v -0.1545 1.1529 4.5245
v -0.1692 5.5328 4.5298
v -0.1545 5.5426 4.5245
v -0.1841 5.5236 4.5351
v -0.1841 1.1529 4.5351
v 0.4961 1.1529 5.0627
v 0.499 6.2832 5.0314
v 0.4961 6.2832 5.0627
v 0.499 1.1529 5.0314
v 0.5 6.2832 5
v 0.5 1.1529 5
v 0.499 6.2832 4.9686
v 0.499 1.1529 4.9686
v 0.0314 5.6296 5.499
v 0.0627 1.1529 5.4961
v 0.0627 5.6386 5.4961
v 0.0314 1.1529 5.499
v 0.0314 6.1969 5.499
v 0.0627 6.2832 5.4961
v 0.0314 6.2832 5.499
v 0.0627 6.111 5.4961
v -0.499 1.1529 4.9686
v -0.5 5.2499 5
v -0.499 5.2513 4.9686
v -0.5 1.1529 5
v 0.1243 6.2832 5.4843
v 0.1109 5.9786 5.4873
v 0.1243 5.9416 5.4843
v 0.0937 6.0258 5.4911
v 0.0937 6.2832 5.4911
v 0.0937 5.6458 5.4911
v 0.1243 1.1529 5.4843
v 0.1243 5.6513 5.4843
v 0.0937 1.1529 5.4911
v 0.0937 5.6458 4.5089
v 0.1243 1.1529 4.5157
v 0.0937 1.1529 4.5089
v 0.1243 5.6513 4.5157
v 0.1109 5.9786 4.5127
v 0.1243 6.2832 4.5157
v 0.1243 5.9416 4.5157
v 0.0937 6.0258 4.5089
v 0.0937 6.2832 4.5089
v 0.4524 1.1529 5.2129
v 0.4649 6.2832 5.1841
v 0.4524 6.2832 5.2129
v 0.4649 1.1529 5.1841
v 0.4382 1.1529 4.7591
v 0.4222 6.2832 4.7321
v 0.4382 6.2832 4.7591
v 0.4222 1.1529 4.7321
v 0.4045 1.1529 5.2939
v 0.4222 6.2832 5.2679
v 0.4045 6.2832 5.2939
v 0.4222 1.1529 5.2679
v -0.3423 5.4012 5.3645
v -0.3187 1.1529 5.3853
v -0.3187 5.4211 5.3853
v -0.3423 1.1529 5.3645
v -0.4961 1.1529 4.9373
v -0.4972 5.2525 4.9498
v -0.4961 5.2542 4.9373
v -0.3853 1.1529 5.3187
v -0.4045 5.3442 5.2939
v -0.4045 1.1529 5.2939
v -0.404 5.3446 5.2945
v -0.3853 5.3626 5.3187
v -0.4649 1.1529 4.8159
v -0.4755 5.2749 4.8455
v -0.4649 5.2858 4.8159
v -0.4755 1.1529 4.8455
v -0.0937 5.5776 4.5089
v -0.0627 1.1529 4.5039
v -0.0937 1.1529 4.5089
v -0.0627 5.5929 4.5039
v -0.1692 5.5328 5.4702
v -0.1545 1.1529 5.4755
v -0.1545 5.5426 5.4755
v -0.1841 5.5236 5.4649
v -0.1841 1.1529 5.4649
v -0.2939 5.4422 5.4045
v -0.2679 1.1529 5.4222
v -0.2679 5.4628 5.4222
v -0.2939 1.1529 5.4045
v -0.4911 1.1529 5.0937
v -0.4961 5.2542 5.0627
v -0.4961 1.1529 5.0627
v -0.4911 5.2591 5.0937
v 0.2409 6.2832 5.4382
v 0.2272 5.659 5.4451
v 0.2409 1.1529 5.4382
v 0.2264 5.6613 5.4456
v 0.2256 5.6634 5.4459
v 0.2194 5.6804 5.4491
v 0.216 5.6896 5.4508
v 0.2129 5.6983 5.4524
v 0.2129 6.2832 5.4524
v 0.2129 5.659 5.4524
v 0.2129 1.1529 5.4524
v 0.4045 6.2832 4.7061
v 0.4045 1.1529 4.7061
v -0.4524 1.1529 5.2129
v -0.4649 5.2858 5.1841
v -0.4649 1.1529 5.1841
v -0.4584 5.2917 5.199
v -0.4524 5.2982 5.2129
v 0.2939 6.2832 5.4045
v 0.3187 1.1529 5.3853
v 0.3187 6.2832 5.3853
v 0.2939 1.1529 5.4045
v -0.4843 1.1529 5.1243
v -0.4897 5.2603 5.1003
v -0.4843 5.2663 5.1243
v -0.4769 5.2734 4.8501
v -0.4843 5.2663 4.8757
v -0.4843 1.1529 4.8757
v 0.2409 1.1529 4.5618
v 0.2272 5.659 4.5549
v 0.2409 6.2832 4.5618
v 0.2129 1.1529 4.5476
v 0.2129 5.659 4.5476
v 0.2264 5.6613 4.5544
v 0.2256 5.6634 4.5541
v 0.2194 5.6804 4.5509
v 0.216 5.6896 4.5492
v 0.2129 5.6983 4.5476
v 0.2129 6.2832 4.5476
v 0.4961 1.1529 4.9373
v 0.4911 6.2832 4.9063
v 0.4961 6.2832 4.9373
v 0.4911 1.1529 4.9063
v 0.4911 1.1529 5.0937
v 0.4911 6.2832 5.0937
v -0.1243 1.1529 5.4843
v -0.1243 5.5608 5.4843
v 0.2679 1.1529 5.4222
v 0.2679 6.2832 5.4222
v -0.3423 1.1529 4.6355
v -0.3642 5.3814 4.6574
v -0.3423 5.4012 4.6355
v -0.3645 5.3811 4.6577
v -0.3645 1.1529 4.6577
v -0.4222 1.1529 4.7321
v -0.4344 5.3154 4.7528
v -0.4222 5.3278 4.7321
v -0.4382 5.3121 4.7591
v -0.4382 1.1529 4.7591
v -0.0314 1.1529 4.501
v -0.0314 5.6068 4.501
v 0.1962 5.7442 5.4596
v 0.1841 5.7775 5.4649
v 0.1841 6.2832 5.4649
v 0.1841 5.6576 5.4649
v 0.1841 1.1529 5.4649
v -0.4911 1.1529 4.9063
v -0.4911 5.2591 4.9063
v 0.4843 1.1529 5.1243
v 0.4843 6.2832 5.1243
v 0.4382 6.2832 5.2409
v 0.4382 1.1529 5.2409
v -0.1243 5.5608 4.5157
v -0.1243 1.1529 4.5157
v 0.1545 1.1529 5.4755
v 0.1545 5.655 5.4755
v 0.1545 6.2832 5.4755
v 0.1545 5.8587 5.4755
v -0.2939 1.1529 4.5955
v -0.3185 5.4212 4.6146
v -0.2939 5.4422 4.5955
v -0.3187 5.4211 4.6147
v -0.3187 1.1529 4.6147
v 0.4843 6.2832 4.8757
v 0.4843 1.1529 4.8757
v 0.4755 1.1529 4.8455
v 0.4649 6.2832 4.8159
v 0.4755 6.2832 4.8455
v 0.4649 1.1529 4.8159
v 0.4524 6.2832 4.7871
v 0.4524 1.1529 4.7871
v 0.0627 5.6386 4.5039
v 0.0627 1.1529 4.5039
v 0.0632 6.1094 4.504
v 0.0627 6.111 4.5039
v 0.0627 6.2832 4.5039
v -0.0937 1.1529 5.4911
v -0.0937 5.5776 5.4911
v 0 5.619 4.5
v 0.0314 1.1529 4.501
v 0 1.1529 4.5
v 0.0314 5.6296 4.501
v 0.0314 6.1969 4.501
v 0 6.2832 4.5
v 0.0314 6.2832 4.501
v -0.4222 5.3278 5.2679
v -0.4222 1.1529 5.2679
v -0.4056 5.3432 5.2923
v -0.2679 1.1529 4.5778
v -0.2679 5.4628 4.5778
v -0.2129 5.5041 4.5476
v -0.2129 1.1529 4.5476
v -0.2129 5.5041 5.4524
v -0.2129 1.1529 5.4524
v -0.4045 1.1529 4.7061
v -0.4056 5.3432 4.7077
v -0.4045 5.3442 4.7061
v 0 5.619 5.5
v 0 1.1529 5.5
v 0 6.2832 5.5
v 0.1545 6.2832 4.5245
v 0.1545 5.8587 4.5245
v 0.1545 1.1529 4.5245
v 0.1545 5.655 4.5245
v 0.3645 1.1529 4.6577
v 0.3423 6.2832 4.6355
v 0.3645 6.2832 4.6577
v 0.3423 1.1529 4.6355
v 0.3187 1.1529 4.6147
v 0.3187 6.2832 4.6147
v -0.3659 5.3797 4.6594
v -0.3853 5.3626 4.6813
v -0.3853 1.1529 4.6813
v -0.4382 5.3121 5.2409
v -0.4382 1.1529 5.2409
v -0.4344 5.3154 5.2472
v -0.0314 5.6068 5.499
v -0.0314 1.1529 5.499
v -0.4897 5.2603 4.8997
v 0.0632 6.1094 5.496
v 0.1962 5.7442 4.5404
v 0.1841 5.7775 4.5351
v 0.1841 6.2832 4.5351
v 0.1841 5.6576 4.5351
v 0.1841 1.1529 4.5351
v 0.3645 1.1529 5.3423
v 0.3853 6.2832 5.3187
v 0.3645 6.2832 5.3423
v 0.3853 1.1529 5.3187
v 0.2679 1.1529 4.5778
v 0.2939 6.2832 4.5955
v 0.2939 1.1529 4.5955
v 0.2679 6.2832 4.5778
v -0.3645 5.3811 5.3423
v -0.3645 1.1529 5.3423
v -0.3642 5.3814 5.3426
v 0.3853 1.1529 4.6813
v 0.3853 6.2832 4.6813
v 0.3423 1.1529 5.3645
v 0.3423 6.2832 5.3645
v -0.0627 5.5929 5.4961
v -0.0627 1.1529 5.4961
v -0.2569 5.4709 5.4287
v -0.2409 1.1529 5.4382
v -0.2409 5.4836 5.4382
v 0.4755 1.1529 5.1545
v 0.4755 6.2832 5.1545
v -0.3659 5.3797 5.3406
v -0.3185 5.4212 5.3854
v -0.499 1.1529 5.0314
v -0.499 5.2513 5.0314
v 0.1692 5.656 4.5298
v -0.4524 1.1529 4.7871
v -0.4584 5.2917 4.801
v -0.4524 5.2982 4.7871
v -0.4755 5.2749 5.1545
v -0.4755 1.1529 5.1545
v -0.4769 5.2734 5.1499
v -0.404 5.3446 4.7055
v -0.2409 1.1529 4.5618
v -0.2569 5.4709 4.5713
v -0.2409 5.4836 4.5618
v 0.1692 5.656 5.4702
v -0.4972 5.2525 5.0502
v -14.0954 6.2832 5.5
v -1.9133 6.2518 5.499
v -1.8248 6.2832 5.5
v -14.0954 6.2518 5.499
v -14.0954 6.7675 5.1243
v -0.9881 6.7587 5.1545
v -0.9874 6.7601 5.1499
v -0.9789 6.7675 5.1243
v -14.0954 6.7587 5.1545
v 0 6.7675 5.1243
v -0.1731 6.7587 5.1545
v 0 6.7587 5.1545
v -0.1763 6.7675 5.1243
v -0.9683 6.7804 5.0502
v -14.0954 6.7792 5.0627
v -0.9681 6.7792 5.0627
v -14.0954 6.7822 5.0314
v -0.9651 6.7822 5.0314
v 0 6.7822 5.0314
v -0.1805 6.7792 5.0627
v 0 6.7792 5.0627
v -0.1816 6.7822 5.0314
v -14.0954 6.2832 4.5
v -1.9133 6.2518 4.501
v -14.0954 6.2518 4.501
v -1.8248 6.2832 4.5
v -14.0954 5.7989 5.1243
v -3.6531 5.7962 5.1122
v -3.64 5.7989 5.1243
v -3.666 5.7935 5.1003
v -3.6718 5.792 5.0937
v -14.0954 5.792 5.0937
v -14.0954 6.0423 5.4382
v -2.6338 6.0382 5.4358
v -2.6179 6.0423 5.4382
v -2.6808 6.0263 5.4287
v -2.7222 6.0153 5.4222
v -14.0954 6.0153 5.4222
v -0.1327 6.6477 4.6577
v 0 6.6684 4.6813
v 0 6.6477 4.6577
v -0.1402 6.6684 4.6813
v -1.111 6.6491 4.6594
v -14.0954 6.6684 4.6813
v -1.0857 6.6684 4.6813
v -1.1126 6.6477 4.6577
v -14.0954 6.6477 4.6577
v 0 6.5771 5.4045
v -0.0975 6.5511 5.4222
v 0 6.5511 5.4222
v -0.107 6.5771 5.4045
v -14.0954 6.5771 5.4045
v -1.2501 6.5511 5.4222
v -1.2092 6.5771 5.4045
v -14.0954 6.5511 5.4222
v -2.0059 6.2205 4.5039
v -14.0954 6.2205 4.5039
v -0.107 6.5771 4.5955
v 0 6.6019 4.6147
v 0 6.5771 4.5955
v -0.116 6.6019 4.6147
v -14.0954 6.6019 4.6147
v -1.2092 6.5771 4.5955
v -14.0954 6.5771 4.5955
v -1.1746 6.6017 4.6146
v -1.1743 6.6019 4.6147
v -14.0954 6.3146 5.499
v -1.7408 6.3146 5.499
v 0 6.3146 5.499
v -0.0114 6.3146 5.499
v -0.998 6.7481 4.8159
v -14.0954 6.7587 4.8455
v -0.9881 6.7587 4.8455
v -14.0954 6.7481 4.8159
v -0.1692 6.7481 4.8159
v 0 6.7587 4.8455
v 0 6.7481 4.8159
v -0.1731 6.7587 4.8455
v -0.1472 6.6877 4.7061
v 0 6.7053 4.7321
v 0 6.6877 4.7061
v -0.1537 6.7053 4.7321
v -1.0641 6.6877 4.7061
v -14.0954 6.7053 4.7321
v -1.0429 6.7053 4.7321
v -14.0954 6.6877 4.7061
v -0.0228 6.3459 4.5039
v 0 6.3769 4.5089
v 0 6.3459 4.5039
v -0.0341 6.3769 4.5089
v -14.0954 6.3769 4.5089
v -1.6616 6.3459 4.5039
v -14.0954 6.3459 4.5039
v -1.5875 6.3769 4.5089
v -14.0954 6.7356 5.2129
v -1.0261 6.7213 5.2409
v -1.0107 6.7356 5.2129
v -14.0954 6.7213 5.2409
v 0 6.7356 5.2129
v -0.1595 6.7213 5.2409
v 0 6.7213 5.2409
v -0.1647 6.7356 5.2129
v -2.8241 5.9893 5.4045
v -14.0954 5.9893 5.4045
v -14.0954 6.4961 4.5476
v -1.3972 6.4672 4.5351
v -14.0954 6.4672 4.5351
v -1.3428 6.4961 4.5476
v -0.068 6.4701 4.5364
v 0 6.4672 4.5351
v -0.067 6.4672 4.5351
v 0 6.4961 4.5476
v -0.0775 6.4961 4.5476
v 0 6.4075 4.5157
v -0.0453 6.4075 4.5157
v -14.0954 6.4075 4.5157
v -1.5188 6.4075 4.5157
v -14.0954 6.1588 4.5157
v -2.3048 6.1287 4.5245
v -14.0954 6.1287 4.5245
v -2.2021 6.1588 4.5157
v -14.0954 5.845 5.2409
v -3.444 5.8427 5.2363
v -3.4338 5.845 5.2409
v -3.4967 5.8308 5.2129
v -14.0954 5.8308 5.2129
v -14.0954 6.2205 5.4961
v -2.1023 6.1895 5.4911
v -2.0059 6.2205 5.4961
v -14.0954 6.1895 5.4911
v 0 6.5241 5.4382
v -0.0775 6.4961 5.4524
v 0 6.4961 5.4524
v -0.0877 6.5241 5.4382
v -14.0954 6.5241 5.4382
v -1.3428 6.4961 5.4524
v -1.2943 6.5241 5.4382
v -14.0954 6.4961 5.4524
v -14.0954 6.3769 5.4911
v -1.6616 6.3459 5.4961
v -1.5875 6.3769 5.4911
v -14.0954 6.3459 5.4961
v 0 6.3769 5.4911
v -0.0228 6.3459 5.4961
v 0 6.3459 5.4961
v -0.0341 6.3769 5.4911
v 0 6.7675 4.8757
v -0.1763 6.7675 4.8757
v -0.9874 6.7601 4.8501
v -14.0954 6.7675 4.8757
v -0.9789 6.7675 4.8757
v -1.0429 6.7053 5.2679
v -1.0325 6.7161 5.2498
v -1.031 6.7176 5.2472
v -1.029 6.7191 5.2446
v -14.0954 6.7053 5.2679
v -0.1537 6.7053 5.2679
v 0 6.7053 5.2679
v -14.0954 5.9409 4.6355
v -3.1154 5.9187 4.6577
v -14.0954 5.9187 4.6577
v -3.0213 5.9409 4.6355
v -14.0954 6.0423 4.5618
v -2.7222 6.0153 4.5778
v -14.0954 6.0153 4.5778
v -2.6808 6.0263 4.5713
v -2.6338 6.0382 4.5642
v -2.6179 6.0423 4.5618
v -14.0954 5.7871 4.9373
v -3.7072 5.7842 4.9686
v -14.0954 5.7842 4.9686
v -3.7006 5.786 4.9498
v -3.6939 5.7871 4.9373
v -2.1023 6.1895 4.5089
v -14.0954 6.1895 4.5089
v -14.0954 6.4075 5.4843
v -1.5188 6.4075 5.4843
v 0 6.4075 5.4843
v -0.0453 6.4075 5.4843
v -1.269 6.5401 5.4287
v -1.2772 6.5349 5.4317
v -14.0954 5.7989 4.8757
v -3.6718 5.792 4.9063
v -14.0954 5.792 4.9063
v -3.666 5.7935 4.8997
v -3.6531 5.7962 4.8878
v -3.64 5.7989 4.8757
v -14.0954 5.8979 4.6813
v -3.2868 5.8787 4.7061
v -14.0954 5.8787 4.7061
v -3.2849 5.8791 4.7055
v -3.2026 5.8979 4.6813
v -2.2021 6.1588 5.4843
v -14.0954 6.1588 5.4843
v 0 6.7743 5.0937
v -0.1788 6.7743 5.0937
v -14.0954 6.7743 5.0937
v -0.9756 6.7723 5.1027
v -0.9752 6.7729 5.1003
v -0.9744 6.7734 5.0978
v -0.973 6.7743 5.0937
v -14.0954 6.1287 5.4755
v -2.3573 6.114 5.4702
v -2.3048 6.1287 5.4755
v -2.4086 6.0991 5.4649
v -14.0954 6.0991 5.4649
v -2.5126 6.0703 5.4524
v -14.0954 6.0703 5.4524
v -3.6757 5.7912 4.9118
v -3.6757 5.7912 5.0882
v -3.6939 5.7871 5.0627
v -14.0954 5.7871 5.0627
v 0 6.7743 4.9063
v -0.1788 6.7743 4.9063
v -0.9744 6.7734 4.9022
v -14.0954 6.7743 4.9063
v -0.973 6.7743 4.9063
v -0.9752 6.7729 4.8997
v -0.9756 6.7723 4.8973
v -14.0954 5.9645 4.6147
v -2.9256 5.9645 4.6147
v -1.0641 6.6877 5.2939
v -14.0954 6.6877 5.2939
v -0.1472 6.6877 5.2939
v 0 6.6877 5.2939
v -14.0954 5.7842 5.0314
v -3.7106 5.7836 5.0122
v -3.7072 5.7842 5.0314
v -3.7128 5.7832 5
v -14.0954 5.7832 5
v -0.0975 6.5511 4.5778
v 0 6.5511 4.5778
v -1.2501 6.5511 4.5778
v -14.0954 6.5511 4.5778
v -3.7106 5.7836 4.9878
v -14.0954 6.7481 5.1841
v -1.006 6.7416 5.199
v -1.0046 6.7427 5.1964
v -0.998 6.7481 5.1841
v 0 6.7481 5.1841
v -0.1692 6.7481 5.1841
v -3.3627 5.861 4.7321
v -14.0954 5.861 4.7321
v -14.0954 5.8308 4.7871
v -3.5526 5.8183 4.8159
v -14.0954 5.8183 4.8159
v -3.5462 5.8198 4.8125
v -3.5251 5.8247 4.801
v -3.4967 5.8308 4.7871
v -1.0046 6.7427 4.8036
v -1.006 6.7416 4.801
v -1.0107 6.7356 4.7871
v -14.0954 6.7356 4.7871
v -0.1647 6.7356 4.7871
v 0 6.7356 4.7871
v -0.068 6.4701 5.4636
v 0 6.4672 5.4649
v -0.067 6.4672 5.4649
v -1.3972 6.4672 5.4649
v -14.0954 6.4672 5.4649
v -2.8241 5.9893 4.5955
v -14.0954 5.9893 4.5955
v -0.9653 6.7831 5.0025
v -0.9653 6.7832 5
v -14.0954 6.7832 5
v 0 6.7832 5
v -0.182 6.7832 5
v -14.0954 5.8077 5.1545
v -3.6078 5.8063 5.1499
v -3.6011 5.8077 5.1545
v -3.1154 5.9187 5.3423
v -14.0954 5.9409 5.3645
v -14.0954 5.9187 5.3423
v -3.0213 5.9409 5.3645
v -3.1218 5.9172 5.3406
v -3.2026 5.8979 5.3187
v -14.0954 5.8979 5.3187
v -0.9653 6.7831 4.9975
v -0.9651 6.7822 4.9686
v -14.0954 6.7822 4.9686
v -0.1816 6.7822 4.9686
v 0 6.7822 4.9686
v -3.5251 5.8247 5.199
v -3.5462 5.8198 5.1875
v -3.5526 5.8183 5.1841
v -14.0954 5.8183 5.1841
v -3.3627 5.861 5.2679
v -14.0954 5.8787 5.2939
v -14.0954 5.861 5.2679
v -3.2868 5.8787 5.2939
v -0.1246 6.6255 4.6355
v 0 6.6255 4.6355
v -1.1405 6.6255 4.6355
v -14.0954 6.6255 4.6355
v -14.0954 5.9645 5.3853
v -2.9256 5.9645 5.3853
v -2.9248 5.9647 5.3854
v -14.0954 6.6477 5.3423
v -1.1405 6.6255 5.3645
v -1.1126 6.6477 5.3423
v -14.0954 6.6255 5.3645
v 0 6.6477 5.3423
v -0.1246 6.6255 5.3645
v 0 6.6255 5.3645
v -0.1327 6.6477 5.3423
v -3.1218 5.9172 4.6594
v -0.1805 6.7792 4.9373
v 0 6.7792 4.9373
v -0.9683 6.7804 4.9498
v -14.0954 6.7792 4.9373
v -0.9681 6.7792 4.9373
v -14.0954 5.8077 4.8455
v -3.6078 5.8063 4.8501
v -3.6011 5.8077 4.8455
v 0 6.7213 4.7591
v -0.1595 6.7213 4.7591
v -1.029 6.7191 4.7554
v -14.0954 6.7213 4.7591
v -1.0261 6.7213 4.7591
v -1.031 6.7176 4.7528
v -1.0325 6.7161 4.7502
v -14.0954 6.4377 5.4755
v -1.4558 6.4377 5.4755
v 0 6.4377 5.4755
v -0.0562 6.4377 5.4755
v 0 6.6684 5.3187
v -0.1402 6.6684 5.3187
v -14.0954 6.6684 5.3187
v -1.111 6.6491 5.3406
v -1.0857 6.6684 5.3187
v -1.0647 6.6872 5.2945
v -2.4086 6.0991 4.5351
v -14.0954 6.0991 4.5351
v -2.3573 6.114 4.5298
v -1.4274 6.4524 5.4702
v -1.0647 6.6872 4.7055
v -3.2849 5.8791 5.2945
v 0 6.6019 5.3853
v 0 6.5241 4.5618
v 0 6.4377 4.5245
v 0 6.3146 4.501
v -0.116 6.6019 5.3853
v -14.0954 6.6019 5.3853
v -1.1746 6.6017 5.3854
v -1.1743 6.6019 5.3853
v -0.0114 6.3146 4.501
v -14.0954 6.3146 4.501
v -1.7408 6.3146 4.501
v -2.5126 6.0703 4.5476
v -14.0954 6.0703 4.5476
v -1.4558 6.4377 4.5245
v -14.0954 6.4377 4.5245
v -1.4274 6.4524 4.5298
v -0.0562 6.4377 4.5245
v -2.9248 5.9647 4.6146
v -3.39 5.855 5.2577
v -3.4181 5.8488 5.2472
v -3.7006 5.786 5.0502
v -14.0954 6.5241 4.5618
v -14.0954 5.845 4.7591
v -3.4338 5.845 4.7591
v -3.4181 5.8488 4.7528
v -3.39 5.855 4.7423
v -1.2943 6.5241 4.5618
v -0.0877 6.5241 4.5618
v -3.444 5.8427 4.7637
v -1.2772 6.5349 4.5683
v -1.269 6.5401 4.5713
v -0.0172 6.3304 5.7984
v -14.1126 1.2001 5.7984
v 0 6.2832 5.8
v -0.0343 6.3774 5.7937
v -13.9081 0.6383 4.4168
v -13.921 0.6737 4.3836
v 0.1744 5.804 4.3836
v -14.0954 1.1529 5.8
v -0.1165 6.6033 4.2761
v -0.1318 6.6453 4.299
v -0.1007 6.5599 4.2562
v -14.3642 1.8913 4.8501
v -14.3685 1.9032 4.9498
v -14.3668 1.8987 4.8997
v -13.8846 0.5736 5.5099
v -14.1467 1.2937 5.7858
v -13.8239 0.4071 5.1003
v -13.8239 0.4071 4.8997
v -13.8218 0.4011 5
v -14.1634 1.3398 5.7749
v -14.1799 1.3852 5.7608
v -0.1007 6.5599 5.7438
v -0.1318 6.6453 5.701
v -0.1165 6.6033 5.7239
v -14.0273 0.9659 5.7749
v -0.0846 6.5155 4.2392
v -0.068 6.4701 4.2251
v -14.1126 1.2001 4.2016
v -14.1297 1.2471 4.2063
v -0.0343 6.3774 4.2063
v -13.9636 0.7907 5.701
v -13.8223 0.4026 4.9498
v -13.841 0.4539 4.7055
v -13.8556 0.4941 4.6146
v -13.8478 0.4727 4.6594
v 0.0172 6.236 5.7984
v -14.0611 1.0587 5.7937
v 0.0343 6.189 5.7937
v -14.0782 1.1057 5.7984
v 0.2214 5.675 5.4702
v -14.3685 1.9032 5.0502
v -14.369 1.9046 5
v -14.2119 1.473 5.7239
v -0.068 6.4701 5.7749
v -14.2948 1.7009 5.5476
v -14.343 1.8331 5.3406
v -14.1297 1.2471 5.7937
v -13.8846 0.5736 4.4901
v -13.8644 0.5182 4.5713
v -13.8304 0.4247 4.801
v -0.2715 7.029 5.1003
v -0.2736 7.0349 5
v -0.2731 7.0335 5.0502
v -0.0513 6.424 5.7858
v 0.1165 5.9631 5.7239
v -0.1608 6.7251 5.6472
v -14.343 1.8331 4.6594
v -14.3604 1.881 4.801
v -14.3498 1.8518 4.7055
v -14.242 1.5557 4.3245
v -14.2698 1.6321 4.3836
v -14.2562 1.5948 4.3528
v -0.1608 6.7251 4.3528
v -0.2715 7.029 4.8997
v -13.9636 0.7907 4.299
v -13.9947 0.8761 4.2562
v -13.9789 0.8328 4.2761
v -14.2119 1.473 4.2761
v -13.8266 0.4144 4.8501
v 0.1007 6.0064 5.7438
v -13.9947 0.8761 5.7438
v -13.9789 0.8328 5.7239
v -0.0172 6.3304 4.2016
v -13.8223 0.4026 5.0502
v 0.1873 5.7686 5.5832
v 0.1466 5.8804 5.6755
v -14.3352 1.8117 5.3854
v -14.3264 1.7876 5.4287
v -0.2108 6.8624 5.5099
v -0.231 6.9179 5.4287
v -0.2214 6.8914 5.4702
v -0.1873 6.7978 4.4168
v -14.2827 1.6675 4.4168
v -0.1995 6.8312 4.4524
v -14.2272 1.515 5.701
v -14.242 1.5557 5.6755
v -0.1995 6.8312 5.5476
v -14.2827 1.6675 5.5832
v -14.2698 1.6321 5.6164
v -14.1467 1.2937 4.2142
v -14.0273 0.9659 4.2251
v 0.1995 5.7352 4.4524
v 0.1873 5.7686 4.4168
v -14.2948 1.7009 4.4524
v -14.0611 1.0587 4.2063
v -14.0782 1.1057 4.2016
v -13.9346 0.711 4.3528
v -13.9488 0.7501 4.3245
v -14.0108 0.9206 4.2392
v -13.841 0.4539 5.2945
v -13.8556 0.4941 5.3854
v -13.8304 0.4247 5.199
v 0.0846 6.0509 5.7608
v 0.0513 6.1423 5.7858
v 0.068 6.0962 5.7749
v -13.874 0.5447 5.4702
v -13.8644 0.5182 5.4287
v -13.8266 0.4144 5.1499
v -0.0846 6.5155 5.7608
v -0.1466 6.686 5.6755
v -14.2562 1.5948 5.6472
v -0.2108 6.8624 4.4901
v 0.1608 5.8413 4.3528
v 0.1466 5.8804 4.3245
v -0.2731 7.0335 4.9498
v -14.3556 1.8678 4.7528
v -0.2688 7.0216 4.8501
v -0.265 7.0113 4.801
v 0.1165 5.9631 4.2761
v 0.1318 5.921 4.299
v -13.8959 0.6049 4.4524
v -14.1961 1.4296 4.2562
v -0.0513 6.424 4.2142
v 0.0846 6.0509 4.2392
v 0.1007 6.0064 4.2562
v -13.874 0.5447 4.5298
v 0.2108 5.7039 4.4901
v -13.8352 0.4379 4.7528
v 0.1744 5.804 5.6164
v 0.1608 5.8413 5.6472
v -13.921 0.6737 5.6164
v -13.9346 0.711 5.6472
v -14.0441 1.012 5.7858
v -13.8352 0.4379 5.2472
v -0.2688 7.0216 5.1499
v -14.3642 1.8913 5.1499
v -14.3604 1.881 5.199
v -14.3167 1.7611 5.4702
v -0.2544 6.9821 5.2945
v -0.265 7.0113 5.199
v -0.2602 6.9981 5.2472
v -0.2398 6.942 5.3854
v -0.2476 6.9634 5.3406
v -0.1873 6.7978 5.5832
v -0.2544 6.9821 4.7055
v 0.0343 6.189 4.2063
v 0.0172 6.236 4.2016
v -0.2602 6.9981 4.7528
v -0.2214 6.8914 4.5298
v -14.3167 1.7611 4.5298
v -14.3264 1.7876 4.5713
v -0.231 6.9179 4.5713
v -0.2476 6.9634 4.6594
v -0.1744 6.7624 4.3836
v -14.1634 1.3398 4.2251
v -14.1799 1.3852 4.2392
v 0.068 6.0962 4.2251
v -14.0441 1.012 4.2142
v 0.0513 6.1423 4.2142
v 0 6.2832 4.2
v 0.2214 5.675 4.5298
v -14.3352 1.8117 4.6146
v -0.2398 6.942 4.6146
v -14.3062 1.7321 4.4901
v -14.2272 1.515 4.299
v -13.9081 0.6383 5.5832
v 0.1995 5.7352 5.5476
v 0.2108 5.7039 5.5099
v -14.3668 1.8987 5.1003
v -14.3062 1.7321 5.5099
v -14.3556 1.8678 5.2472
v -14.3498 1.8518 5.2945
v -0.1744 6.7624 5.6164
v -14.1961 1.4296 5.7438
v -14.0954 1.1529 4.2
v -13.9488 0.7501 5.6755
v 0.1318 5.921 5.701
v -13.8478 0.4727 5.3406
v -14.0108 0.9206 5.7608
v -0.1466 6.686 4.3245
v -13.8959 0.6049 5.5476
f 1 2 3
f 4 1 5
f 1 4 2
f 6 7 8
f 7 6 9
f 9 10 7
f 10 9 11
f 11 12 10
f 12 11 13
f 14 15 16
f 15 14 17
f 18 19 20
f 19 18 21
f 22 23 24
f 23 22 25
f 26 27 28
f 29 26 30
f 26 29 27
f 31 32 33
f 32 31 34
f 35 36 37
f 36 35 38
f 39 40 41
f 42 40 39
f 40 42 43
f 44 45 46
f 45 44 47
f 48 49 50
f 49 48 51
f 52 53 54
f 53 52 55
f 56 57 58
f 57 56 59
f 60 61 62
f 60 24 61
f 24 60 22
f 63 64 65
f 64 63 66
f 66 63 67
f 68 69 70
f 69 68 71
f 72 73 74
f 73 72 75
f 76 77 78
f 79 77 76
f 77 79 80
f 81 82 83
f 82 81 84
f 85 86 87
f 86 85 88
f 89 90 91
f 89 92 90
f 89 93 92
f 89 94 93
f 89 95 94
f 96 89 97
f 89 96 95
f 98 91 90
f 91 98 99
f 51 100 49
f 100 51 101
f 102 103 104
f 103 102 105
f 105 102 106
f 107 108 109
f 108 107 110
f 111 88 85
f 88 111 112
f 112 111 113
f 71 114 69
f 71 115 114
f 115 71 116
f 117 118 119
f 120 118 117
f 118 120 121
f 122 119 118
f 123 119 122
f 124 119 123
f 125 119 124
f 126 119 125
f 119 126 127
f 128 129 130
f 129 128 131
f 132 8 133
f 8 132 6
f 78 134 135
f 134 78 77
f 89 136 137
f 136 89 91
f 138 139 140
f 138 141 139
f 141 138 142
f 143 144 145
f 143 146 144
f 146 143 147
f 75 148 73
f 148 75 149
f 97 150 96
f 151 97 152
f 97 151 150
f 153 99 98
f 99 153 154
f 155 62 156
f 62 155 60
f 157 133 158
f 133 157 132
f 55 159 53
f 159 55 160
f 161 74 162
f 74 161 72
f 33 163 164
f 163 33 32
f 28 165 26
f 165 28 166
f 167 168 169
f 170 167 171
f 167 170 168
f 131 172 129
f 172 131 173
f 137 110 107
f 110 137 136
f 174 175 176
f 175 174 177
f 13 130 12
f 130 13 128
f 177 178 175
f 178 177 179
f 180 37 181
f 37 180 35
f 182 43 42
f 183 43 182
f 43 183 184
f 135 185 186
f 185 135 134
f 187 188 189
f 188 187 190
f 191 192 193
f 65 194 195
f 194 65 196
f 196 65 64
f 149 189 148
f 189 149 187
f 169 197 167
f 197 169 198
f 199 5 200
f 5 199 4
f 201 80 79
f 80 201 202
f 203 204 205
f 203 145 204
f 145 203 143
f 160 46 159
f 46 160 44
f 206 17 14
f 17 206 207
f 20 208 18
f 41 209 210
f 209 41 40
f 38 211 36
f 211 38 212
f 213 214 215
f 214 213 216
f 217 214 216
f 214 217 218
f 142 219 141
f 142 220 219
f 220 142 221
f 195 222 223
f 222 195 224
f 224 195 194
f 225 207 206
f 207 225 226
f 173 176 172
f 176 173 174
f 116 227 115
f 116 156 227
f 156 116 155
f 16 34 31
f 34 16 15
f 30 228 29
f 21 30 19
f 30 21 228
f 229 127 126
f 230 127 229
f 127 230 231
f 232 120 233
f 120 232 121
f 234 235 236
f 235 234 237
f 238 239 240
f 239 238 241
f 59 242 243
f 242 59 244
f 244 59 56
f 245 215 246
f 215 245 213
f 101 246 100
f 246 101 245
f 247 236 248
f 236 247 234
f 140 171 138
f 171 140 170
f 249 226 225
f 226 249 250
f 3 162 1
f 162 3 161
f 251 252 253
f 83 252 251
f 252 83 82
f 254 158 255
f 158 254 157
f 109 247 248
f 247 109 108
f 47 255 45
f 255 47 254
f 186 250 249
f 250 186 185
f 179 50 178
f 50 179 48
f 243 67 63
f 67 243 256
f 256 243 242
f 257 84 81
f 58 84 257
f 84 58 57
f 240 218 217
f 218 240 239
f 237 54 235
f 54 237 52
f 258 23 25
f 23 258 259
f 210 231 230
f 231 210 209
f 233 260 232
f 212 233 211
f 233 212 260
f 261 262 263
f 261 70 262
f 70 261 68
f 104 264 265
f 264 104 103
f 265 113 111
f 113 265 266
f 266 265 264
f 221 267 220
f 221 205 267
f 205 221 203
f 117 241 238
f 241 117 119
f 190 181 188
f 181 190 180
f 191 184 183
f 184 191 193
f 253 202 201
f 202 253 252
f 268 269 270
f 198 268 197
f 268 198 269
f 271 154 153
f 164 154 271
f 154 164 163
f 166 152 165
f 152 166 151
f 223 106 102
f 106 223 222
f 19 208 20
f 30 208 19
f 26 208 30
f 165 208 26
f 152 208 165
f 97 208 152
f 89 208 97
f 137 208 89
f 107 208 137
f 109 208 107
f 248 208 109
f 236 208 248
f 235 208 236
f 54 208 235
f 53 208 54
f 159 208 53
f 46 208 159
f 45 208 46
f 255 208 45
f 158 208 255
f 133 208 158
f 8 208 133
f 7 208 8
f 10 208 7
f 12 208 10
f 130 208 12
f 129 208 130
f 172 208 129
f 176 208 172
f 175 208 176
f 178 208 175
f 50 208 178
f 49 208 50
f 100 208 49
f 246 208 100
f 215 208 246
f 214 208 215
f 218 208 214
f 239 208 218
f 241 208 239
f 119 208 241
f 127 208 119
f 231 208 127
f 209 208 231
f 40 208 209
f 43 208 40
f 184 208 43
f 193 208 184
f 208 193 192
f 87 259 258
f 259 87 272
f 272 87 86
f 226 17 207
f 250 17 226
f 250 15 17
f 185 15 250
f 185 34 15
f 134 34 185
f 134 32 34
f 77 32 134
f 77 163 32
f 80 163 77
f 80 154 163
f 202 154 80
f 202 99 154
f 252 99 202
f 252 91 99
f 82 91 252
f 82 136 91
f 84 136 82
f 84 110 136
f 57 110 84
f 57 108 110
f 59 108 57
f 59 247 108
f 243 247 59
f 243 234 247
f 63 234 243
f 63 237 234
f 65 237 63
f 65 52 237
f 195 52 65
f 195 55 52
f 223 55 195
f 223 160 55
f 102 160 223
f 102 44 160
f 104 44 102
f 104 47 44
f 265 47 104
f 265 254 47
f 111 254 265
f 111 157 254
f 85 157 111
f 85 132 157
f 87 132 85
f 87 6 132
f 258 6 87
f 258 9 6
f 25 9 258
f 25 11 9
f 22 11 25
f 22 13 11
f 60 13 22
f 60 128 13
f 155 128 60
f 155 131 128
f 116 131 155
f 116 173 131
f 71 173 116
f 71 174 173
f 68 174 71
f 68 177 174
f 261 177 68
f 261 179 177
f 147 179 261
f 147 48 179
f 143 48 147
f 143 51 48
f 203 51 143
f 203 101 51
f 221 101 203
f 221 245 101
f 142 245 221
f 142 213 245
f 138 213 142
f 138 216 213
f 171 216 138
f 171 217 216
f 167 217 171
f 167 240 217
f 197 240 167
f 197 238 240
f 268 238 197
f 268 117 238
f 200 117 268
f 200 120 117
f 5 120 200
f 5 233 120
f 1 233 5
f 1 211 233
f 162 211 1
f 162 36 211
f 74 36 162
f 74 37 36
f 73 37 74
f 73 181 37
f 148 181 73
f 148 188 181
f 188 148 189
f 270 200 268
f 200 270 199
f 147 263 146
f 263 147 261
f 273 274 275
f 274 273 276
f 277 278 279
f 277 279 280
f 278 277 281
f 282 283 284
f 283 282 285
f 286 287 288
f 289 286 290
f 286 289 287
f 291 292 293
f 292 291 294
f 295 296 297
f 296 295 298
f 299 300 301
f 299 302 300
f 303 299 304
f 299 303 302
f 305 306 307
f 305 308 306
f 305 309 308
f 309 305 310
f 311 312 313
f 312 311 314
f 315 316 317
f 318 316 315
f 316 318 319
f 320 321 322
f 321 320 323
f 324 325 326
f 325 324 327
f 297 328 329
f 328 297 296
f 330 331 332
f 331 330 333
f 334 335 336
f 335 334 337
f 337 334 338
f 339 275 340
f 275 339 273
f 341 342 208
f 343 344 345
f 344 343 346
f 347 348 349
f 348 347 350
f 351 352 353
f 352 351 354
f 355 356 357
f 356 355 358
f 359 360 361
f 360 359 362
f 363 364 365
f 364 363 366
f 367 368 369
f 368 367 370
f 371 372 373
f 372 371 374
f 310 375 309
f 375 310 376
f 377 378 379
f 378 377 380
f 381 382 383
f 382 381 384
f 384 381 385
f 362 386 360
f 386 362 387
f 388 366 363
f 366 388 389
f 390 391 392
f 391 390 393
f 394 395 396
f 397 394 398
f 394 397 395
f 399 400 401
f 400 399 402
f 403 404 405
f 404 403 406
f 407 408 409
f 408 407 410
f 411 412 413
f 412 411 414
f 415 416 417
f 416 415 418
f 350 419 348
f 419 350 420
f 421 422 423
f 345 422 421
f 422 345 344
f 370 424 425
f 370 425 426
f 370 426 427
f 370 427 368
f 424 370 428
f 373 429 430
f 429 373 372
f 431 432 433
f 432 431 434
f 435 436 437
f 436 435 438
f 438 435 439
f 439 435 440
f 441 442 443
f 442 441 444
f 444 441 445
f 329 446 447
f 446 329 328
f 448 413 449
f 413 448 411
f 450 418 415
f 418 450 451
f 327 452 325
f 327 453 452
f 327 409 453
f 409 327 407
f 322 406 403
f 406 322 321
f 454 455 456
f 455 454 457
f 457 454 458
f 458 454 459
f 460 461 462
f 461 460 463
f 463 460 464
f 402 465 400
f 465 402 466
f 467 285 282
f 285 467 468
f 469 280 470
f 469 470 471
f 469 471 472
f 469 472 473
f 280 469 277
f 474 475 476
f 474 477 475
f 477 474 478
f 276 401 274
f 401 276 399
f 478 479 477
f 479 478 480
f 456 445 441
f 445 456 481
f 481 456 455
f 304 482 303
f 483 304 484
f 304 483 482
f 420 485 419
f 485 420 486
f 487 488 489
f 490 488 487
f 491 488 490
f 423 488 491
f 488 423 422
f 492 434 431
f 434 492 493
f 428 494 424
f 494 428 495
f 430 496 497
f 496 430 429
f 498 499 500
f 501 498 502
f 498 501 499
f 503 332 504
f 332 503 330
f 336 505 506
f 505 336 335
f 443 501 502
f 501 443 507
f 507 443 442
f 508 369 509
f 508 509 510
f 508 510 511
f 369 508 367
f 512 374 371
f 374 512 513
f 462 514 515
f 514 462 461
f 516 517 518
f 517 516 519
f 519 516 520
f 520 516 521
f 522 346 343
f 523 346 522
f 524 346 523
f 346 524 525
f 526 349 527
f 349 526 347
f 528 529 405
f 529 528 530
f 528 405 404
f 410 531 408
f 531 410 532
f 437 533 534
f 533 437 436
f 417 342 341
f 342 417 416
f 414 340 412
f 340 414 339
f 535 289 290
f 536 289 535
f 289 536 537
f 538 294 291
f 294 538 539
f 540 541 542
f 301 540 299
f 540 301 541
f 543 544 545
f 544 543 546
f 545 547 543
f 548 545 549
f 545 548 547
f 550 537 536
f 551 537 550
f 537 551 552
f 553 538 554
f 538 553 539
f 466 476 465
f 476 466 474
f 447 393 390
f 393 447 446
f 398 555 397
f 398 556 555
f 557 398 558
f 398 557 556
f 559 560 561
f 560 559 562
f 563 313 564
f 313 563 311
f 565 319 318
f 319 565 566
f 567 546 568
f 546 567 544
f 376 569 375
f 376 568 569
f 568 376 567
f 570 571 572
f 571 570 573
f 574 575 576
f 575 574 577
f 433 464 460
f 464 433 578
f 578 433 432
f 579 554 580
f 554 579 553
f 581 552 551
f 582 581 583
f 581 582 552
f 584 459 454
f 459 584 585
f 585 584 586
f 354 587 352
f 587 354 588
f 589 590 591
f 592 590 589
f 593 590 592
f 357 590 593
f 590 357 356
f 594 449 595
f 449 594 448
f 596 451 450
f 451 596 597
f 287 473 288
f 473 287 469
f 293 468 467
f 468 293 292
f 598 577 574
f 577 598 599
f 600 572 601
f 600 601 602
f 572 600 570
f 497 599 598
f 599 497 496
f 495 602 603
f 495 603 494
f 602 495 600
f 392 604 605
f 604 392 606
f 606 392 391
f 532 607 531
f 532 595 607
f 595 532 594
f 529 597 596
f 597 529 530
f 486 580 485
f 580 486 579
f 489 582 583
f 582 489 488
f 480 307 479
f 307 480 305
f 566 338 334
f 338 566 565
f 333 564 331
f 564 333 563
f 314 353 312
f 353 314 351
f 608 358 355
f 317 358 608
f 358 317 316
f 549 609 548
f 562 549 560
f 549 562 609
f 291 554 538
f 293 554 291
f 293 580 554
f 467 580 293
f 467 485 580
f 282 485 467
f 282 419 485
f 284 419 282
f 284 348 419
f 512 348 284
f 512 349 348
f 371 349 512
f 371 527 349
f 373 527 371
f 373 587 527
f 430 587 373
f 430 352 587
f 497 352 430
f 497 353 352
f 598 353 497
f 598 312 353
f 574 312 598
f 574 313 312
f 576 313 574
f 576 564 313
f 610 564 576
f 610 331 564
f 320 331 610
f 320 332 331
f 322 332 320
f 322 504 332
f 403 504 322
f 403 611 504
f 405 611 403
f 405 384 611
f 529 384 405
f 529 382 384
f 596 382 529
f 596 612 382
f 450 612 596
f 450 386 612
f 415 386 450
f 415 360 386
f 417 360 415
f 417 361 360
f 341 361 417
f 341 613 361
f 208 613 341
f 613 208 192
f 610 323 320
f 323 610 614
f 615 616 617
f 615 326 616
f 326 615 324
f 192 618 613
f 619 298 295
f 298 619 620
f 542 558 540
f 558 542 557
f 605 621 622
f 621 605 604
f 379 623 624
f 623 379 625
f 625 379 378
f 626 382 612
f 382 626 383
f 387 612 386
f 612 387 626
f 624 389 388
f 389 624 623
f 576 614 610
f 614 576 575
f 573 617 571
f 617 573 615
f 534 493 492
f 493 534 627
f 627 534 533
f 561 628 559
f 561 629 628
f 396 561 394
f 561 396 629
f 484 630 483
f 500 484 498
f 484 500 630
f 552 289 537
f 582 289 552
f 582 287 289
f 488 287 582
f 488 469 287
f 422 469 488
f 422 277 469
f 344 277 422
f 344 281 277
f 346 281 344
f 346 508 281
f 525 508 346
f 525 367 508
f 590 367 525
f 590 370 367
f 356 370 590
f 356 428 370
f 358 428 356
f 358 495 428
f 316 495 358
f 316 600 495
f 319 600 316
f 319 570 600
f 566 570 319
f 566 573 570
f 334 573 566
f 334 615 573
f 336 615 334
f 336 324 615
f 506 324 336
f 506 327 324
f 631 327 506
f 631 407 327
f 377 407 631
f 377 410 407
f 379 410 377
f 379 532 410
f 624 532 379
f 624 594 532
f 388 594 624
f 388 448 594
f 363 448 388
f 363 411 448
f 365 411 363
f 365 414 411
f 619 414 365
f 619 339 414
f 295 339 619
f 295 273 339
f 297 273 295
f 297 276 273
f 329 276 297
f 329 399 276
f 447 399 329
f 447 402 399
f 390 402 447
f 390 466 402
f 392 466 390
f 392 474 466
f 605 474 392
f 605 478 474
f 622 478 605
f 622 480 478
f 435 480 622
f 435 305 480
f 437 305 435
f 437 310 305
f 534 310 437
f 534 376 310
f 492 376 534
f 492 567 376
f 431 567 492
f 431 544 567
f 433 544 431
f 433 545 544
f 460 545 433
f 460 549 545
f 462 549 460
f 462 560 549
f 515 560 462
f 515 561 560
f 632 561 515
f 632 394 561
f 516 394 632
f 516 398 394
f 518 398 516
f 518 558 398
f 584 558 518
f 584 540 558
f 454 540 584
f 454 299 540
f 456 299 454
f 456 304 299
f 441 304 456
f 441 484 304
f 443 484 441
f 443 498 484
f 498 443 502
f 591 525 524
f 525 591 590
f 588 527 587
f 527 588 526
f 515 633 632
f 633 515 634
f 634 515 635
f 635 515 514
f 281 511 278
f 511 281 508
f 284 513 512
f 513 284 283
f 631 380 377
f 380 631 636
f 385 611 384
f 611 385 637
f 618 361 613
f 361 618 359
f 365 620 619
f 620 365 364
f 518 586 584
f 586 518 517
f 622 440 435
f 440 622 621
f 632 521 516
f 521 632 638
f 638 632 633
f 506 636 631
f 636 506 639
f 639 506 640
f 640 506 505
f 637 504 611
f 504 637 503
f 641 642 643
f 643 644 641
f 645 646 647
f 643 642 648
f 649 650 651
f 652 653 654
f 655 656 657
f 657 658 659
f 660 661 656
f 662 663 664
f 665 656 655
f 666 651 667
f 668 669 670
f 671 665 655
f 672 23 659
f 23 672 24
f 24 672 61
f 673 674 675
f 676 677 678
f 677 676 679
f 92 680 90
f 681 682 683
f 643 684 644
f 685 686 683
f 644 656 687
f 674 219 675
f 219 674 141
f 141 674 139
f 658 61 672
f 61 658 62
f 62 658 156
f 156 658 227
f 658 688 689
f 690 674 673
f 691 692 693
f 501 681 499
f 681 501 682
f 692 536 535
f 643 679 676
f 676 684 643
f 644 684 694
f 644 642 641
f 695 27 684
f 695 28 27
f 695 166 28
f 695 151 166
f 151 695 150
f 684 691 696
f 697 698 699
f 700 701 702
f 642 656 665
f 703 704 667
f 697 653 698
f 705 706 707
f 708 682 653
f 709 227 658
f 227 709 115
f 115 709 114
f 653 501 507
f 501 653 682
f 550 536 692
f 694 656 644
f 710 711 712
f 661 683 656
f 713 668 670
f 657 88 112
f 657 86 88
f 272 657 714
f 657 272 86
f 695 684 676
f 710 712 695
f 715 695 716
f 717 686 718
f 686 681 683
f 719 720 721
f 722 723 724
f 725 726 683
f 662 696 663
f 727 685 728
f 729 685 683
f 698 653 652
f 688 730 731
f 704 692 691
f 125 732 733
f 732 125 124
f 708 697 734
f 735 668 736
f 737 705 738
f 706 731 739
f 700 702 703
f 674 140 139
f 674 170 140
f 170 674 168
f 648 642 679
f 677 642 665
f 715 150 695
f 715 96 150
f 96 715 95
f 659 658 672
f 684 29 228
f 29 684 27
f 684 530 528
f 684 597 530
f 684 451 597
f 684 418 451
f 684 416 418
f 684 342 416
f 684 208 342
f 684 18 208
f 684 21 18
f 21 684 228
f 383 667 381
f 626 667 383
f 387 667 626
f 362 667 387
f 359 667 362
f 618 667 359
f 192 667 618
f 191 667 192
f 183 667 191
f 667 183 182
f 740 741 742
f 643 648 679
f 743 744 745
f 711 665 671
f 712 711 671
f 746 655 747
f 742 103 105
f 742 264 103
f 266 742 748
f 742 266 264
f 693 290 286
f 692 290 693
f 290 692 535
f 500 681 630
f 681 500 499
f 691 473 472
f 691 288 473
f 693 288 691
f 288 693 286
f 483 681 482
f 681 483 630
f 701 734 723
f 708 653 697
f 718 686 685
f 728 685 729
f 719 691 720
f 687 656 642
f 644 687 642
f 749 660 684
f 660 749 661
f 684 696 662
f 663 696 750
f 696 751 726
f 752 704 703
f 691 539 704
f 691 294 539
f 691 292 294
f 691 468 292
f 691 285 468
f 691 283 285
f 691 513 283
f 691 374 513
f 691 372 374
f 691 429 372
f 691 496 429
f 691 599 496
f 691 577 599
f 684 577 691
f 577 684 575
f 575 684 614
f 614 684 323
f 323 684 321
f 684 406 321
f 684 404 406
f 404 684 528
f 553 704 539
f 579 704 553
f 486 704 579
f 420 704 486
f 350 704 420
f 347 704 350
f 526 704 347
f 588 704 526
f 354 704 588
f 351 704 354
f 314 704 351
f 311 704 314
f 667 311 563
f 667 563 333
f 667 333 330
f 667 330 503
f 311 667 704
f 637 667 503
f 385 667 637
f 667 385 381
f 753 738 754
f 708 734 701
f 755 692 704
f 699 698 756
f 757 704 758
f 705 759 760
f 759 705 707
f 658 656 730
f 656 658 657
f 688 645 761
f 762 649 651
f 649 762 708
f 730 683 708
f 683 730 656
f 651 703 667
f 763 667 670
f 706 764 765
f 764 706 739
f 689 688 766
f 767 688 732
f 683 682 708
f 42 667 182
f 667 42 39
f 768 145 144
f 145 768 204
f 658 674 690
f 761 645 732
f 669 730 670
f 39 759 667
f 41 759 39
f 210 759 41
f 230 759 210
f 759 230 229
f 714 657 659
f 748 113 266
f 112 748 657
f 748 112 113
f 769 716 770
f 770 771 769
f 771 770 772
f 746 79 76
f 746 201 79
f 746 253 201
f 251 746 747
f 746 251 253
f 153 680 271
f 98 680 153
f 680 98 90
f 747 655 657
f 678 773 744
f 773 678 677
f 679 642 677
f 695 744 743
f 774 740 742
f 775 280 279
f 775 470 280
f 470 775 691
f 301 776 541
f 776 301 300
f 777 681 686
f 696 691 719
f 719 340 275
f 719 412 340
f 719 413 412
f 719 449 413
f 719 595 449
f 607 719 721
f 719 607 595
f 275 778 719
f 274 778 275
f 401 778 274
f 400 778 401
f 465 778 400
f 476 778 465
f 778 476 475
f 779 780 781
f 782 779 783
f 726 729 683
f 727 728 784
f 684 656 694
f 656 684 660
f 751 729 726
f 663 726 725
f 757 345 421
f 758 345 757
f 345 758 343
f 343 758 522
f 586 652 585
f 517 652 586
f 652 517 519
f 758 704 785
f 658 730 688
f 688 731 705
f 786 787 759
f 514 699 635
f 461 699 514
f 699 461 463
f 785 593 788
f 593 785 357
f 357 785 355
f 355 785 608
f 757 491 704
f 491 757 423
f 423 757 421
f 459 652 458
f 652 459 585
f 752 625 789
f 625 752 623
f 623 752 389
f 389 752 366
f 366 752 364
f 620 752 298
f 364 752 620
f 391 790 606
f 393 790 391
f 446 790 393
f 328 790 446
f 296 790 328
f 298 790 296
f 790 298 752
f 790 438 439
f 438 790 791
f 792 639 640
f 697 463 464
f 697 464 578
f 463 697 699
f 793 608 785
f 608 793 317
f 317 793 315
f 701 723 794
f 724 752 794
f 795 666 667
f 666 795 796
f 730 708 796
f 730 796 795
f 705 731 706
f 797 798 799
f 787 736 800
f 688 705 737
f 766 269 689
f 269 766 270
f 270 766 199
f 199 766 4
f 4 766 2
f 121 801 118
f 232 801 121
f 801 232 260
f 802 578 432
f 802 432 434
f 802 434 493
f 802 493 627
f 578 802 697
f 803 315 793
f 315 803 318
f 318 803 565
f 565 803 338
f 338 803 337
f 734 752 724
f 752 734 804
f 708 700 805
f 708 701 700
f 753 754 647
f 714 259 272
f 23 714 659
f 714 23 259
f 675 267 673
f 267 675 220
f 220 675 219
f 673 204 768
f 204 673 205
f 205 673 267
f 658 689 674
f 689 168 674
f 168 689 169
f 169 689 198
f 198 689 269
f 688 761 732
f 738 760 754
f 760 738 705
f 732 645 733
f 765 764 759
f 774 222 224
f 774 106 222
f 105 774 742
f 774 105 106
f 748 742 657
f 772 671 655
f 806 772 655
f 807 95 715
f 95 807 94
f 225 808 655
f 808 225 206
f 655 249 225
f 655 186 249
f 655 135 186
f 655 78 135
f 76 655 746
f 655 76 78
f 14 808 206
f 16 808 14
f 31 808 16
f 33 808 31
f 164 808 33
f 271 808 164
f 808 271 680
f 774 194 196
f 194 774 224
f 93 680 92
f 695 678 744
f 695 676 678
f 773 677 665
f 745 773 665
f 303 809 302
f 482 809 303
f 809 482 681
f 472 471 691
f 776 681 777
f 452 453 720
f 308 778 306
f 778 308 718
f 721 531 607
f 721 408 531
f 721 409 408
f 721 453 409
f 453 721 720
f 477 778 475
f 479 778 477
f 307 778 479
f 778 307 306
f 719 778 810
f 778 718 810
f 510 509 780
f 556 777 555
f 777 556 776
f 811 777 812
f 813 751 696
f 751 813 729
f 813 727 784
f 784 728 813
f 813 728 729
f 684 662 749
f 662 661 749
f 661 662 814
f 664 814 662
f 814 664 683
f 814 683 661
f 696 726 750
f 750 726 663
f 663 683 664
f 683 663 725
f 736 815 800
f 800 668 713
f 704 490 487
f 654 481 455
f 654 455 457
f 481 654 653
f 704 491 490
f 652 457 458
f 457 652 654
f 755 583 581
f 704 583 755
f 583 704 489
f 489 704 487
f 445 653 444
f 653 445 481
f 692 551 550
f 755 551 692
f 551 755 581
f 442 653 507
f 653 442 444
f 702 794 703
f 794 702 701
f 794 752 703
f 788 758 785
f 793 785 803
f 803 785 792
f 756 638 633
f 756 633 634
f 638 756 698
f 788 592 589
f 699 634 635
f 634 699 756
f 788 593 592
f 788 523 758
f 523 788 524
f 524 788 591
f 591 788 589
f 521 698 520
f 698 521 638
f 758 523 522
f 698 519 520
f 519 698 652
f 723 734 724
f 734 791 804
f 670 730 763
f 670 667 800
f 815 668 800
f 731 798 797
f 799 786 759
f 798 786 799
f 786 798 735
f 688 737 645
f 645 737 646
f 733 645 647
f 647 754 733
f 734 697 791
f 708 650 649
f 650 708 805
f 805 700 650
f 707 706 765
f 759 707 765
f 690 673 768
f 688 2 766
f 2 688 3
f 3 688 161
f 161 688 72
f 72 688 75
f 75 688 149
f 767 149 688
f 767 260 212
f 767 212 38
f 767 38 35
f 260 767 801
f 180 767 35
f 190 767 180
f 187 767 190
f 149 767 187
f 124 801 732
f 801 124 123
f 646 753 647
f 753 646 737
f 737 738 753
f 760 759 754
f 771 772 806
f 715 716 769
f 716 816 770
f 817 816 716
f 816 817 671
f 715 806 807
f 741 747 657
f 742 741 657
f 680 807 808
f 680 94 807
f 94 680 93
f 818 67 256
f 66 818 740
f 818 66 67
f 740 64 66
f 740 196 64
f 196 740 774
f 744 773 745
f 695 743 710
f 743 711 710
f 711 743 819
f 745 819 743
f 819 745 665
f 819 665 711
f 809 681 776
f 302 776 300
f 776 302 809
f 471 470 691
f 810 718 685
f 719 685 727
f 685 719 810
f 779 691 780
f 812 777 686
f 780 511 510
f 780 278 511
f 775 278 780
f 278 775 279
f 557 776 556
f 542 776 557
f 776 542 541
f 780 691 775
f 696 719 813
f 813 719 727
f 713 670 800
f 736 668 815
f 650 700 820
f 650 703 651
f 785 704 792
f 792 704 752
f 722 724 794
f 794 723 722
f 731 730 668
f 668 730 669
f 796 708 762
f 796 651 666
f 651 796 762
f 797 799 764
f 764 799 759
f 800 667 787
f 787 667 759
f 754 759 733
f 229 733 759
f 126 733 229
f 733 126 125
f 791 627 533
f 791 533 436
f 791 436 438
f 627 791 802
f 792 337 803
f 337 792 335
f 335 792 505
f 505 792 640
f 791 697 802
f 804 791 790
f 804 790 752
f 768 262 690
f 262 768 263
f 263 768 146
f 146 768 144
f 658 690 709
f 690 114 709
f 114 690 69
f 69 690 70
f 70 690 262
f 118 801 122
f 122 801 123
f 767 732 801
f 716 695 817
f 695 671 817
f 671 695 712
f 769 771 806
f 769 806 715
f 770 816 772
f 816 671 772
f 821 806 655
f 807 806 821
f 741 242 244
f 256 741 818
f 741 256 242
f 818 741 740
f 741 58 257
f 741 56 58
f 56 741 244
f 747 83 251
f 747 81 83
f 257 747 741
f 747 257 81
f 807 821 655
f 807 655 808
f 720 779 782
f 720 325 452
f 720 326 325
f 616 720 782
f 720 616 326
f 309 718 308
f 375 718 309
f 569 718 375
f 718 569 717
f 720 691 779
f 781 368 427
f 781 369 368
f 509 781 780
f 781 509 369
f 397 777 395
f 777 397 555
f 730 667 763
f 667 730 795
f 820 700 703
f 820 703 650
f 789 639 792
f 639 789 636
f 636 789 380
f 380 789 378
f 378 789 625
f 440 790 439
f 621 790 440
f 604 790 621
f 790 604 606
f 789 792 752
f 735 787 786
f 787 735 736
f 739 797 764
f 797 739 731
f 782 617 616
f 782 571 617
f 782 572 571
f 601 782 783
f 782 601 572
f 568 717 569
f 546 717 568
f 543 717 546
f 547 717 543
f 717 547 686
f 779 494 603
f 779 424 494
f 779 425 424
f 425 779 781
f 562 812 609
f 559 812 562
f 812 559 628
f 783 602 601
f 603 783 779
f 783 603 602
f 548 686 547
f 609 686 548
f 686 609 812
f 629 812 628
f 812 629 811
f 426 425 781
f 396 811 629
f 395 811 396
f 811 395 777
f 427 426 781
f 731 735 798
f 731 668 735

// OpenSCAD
/*  
===== Gear Design: Rack Gear =====
- Inputs: 
    > Module Value (m) - Determines tooth size
    > Pressure Angle (pa) - Determines the line of action between two teeth
    > Tooth Count (z) - Determines the amount of teeth on a gear

- Compatibility Dependence: Pinion Partner
    > Module Value (m)
    > Pressure Angle (pa)

- Parameters: 
    > Pitch: Distance between a fixed position on two adjacent teeth.
    > Pitch line: Tangent to the pitch circle of a pinion partner. 
        >> *NOTE* "Line" not "Circle" because the rack is effectively a gear with an infinite pitch radius.
    > Dedendum: The distance from the bottom tooth face to the pitch line.
    > Addendum: The distance from the pitch line to the top of the tooth face. 
*/

/*
===== Tooth Design: =====
Tooth width at the pitch line: πm/2
Pressure angle is 20º (convention)

Split tooth into addendum (module, m) and dedendum (1.25 * m) defined parts: 
Given the height and pa we know the base of each right triangle
> b = m * tan(pa)
the tooth tip then has a width: 
> πm/2 - 2*b

Applying the same procedure to find the bottom of the rack tooth: 
> b = (1.25*m) * tan(pa)
> πm / 2 + 2b

Therefore, the trapezoidal rack tooth profile is defined by:
> b1 = πm/2 - 2 * m * tan(pa)
> b2 = πm / 2 + 2 * (1.25*m) * tan(pa)
*/

// ========== IMPORTS ========== //
use <spur_gear.scad>;

// ========== GLOBAL ========== //
$fn = 100;

// ========== CONSTANTS ========== // 
// TODO: Include relevant build items in stock

/*
Ball Bearing Stock: 
    > 3.175mm
        > ID: 3.175mm | OD: 9.525mm | H: 3.6875mm |
    > 5mm
        > ID: 5mm | OD: 14mm | H: 5mm |
    > 6.35mm 
        > ID: 6.35mm | OD: 15.875mm | H: 4.9784mm
    > 8mm 
        > Model 698 -- ID: 8mm | OD: 19mm | H: 6mm <--
        > Model 608 -- ID: 8mm | OD: 22mm | H: 7mm
        > Model 628 -- ID: 8mm | OD: 24mm | H: 8mm
    > 17mm 
        > Model 6903 -- ID: 17mm | OD: 30mm | H: 7mm <--
        > Model 6003 -- ID: 17mm | OD: 35mm | H: 10mm
        > Model 6203 -- ID: 17mm | OD: 40mm | H: 12mm
*/
bb_698_id = 8;
bb_698_od = 19;
bb_698_h = 6;

bb_6903_id = 17;
bb_6903_od = 30;
bb_6903_h = 7;

// ========== VARIABLES ========== //


// ========== LOGIC ========== //
/*
The rack gear works to convert rotational motion into linear motion.  
*/
function radial_force(pa) = sin(pa);

function tangential_force(pa) = cos(pa);

function resultant_force() = 1;

// ========== STRUCTURES ========== //

/*
The rack gear tooth has a trapezoidal shape with straight edge interactions because the radius of the
    rack is considered to be effectively infinite. Calling on the Fundamental Law of Gearing to guide 
    our understanding of the interaction between a pinion and the gear, we know the interaction needs 
    to happen along a line of action that is aligned with the pinion. If we approximate the 
    rack gear 'face' as planar then we can approximate it as the pitch plane and assume the equivalent
    involute angle will be reliant on a base circle with a surface effectively parallel to the pitch plane. 
    We'd design for the rack gear tooth to have a perpendicular that makes an angle equivalent
    to the pressure angle with the base cylinder, which in this case is a plane. Therefore, the rack gear 
    tooth is straight edged with a trapezoidal form. 
*/

// m := module value
// pa := pressure angle
module rack_tooth(
    m,
    pa
) {
    tooth_height = 2.25 * m;
    top_width = PI * m / 2 - 2 * m * tan(pa);
    bottom_width = PI * m / 2 + 2 * (1.25*m) * tan(pa);
    
    polygon([
        [-top_width / 2, tooth_height],
        [top_width / 2, tooth_height],
        [bottom_width / 2, 0],
        [-bottom_width / 2, 0]
    ]);
}

// m := module value
// z := tooth count
// pa := pressure angle
module rack_2D(
    rack_width,
    m,
    z, 
    pa
) {
    pitch = PI * m;
    bottom_width = PI * m / 2 + 2 * (1.25*m) * tan(pa);
    rack_length = pitch * z;

    assert(rack_length % pitch == 0, "Choose compatible rack_length and pitch!");
    union() {
        square([rack_length, rack_width], center = true);
        for(i = [-rack_length / 2 + bottom_width / 2: pitch: rack_length / 2 - bottom_width / 2]) {
            translate([i, rack_width / 2, 0])
                rack_tooth(
                    m, 
                    pa
                );
        }
    }
}

module rack_3D(
    rack_thickness,
    rack_width,
    m,
    z, 
    pa
) {
    linear_extrude(height = rack_thickness) {
        rack_2D(rack_width, m, z, pa);
    }
}

module rack_3D_force_overlay(
    rack_thickness,
    rack_width,
    m,
    z, 
    pa
) {
    pitch = PI * m;
    %linear_extrude(height = rack_thickness) {
        rack_2D(rack_width, m, z, pa);
    }

    /*
        Forces: 
        - Radial 
        - Tangential 
        - Resultant 
    */
    echo(pa);
    translate([0, pitch, rack_thickness / 2]) {
        vector_scale = 15;
        color("blue") 
            rotate([90, 0, 0]) cylinder(h = vector_scale * radial_force(pa), r = 0.5);
        color("green") 
            rotate([0, -90, 0]) cylinder(h = vector_scale * tangential_force(pa), r = 0.5);
        color("purple")
            rotate([0, -90, pa])
                cylinder(h = vector_scale, r = 0.8);
    }
}

// ========== BUILD ========== //

// ========== ASSEMBLY ========== //
m = 2;
pa = 20;
gear_z = 24;
rack_z = 20;

rack_gap = 10;
rack_thickness = 10;
rack_width = 2.5;

rack_3D_force_overlay(
    rack_thickness, 
    rack_width,
    m, 
    rack_z,
    pa
);
